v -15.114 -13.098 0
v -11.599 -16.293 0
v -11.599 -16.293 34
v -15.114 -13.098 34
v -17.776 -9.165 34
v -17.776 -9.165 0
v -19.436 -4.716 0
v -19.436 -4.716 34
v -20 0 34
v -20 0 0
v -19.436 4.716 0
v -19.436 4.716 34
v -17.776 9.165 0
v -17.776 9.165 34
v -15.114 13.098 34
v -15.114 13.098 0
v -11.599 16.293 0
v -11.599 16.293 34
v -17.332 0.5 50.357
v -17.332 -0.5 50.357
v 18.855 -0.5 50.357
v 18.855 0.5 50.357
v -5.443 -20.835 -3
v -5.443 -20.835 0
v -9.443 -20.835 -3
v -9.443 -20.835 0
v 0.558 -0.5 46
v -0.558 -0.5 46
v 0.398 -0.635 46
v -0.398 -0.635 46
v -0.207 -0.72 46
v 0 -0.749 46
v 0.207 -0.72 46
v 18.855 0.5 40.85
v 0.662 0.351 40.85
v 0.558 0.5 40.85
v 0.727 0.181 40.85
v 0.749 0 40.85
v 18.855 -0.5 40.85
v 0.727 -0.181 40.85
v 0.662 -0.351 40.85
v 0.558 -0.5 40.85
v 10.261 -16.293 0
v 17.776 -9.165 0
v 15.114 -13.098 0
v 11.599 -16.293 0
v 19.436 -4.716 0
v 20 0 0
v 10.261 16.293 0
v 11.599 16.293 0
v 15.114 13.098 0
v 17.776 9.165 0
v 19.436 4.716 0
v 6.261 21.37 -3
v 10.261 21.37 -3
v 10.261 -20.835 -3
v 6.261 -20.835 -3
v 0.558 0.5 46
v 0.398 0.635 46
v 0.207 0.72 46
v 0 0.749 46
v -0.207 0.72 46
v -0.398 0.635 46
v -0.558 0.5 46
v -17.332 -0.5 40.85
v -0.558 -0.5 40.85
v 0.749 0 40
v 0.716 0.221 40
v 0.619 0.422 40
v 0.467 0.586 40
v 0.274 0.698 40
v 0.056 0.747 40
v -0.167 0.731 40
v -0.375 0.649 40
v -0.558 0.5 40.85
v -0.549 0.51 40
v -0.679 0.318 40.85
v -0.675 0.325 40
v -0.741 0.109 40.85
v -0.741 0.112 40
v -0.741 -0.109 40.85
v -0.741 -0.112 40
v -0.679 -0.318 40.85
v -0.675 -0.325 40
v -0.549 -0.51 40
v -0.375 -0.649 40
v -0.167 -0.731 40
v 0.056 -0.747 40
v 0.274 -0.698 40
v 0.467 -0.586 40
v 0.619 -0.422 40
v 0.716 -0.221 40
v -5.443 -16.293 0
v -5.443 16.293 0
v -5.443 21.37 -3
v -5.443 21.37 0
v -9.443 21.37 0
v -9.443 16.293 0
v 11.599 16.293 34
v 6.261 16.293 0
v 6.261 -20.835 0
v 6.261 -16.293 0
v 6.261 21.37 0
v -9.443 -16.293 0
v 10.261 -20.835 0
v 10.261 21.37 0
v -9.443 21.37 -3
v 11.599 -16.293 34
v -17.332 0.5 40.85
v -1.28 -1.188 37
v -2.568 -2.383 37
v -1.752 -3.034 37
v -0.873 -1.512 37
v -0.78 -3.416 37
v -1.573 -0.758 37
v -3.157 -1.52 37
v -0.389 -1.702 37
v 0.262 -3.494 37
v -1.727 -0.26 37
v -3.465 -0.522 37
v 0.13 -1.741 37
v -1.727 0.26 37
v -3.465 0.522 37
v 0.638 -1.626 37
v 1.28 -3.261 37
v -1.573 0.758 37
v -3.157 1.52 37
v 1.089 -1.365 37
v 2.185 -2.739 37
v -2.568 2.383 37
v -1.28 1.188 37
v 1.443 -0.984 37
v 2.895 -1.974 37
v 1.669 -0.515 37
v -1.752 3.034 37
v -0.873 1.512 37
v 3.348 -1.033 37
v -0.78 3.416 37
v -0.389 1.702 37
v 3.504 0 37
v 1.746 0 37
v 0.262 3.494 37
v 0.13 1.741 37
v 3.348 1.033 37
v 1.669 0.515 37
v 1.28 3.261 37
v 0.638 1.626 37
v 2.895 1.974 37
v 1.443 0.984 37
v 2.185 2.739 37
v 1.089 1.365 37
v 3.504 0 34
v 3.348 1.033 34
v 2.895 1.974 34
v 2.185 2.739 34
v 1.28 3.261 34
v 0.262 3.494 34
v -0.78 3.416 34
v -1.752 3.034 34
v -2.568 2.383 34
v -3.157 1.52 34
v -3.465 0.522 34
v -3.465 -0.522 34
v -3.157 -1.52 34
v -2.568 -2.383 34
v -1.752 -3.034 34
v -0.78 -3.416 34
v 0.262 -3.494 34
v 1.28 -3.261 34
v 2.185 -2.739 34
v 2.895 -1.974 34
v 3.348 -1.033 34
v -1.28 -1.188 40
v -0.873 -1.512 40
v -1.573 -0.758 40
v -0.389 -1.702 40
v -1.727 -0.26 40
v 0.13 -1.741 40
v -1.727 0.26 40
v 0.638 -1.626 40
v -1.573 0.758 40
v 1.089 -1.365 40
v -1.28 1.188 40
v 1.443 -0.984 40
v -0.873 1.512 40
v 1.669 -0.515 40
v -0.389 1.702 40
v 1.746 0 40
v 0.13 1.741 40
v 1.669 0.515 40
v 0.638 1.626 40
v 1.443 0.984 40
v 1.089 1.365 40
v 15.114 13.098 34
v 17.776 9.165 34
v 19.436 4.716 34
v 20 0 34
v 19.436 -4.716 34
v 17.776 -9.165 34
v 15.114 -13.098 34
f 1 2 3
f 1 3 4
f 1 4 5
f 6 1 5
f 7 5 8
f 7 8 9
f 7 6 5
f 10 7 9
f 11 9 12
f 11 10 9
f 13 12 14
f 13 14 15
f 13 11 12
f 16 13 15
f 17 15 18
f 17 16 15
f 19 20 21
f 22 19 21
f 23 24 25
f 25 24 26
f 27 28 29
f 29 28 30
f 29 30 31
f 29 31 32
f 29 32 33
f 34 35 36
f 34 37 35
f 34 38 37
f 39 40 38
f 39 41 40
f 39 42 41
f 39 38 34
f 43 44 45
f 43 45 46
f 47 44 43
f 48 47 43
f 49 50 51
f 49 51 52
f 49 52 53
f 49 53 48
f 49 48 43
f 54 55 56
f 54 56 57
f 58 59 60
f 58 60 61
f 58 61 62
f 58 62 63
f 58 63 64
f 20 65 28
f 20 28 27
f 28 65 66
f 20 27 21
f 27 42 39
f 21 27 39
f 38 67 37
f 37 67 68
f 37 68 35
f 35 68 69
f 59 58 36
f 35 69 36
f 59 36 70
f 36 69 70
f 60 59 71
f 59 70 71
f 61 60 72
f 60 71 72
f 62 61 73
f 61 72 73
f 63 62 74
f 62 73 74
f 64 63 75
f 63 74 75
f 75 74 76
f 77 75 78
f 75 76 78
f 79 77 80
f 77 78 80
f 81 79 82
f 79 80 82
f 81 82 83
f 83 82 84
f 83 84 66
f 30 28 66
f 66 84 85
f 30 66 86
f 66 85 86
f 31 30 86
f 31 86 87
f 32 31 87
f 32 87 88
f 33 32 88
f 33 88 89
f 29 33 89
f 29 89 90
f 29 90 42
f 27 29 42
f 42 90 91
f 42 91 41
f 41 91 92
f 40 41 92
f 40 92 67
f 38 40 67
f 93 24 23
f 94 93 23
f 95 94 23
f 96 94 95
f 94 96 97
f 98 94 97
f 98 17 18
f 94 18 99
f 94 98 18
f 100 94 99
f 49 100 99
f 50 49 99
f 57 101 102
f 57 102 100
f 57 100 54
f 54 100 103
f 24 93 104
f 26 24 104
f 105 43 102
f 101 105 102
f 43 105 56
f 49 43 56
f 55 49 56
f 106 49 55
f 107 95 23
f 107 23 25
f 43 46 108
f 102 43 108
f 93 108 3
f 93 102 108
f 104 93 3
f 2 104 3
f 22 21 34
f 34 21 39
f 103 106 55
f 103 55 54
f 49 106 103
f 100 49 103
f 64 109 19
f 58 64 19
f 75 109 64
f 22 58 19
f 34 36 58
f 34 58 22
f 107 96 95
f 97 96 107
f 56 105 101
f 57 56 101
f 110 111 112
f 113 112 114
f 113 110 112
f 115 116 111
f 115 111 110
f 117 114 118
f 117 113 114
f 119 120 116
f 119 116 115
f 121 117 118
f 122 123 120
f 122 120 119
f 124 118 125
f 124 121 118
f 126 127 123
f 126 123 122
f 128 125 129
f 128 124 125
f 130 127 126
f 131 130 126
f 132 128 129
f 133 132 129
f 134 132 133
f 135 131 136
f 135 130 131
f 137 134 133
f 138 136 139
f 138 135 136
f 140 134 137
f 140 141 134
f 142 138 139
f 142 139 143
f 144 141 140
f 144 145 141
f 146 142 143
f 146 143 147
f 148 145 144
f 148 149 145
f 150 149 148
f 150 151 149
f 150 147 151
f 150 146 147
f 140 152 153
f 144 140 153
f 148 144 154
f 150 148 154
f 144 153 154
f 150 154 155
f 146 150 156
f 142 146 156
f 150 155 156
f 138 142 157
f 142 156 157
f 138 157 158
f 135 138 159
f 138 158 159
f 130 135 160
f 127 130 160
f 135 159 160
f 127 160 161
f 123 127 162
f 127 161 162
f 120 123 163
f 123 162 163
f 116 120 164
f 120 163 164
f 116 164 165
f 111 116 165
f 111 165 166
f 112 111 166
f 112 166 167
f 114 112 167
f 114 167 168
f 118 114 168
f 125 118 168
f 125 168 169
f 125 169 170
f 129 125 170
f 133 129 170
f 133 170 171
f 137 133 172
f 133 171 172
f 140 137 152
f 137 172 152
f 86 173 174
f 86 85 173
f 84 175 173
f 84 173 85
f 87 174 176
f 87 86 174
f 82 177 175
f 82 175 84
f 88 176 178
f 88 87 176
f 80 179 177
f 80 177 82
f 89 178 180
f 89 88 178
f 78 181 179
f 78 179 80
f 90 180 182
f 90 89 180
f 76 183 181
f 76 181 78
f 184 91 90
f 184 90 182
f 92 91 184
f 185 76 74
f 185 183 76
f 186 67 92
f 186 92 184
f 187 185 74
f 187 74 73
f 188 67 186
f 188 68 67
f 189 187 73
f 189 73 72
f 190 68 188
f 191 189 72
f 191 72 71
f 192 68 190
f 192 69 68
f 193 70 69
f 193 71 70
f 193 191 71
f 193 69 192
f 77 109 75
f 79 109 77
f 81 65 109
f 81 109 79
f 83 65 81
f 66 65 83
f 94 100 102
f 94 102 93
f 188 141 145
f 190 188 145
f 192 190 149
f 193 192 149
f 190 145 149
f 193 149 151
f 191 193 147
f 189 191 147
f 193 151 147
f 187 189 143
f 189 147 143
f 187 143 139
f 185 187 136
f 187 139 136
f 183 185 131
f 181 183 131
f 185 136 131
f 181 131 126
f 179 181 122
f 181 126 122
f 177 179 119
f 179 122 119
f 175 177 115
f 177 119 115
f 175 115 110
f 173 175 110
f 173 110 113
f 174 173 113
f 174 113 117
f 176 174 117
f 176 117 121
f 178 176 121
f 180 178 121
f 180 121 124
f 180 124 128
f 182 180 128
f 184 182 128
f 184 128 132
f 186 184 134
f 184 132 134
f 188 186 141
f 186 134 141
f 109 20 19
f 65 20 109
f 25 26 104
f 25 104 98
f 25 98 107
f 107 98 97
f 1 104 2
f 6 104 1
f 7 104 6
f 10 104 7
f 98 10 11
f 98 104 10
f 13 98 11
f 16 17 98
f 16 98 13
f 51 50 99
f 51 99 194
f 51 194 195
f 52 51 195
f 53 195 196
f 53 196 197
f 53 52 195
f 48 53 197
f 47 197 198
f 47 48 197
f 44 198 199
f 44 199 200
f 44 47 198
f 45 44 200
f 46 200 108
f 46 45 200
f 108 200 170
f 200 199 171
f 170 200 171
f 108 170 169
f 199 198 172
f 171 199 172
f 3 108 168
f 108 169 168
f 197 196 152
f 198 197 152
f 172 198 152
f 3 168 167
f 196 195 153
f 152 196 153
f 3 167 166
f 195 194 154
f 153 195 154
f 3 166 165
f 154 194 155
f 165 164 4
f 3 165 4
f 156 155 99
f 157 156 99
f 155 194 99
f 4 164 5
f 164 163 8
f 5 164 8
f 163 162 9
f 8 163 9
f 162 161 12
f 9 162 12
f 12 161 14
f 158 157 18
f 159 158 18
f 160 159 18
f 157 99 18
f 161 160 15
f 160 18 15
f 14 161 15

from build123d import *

# Parameters (mm, degrees)
BOSS_EXTRUDE1_DEPTH      = 34
SKETCH2_R                = 3.503672553
BOSS_EXTRUDE2_DEPTH      = 3
SKETCH3_R                = 1.746279777
BOSS_EXTRUDE3_DEPTH      = 3
SKETCH4_R                = 0.749347306
BOSS_EXTRUDE4_DEPTH      = 6
SKETCH5_W                = 4
SKETCH5_H                = 42.204508387
BOSS_EXTRUDE5_DEPTH      = 3
BOSS_EXTRUDE7_DEPTH      = 0.5
BOSS_EXTRUDE7_DEPTH_BACK = 0.5
SKETCH7_W                = 36.186676628
SKETCH7_H                = 9.506502519


with BuildPart() as part:
    # Sketch1 → Boss-Extrude1 (new body)
    with BuildSketch(Plane.XY):
        with BuildLine():
            Line((-11.599484275, 16.292696663), (11.599484275, 16.292696663))
            ThreePointArc((11.599484275, 16.292696663), (20, 0), (11.599484275, -16.292696663))
            Line((11.599484275, -16.292696663), (-11.599484275, -16.292696663))
            ThreePointArc((-11.599484275, -16.292696663), (-20, 0), (-11.599484275, 16.292696663))
        make_face()
    extrude(amount=BOSS_EXTRUDE1_DEPTH)

    # Sketch2 → Boss-Extrude2 (add)
    with BuildSketch(Plane.XY.offset(34)):
        Circle(SKETCH2_R)
    extrude(amount=BOSS_EXTRUDE2_DEPTH)

    # Sketch3 → Boss-Extrude3 (add)
    with BuildSketch(Plane.XY.offset(37)):
        Circle(SKETCH3_R)
    extrude(amount=BOSS_EXTRUDE3_DEPTH)

    # Sketch4 → Boss-Extrude4 (add)
    with BuildSketch(Plane.XY.offset(40)):
        Circle(SKETCH4_R)
    extrude(amount=BOSS_EXTRUDE4_DEPTH)

    # Sketch5 → Boss-Extrude5 (add)
    with BuildSketch(Plane(origin=(0, 0, 0), x_dir=(-1, 0, 0), z_dir=(0, 0, -1))):
        with Locations((-8.261138403, 0.267681872)):
            Rectangle(SKETCH5_W, SKETCH5_H)
        with Locations((7.442864718, 0.267681872)):
            Rectangle(SKETCH5_W, SKETCH5_H)
    extrude(amount=BOSS_EXTRUDE5_DEPTH)

    # Sketch7 → Boss-Extrude7 (add, two sides: drawn at the far end of the back side and taken through both)
    with BuildSketch(Plane(origin=(0, 0, 0), x_dir=(1, 0, 0), z_dir=(0, 1, 0)).offset(-BOSS_EXTRUDE7_DEPTH_BACK)):
        with Locations((0.761824771, -45.603600446)):
            Rectangle(SKETCH7_W, SKETCH7_H)
    extrude(amount=BOSS_EXTRUDE7_DEPTH + BOSS_EXTRUDE7_DEPTH_BACK)


solid = part.part
